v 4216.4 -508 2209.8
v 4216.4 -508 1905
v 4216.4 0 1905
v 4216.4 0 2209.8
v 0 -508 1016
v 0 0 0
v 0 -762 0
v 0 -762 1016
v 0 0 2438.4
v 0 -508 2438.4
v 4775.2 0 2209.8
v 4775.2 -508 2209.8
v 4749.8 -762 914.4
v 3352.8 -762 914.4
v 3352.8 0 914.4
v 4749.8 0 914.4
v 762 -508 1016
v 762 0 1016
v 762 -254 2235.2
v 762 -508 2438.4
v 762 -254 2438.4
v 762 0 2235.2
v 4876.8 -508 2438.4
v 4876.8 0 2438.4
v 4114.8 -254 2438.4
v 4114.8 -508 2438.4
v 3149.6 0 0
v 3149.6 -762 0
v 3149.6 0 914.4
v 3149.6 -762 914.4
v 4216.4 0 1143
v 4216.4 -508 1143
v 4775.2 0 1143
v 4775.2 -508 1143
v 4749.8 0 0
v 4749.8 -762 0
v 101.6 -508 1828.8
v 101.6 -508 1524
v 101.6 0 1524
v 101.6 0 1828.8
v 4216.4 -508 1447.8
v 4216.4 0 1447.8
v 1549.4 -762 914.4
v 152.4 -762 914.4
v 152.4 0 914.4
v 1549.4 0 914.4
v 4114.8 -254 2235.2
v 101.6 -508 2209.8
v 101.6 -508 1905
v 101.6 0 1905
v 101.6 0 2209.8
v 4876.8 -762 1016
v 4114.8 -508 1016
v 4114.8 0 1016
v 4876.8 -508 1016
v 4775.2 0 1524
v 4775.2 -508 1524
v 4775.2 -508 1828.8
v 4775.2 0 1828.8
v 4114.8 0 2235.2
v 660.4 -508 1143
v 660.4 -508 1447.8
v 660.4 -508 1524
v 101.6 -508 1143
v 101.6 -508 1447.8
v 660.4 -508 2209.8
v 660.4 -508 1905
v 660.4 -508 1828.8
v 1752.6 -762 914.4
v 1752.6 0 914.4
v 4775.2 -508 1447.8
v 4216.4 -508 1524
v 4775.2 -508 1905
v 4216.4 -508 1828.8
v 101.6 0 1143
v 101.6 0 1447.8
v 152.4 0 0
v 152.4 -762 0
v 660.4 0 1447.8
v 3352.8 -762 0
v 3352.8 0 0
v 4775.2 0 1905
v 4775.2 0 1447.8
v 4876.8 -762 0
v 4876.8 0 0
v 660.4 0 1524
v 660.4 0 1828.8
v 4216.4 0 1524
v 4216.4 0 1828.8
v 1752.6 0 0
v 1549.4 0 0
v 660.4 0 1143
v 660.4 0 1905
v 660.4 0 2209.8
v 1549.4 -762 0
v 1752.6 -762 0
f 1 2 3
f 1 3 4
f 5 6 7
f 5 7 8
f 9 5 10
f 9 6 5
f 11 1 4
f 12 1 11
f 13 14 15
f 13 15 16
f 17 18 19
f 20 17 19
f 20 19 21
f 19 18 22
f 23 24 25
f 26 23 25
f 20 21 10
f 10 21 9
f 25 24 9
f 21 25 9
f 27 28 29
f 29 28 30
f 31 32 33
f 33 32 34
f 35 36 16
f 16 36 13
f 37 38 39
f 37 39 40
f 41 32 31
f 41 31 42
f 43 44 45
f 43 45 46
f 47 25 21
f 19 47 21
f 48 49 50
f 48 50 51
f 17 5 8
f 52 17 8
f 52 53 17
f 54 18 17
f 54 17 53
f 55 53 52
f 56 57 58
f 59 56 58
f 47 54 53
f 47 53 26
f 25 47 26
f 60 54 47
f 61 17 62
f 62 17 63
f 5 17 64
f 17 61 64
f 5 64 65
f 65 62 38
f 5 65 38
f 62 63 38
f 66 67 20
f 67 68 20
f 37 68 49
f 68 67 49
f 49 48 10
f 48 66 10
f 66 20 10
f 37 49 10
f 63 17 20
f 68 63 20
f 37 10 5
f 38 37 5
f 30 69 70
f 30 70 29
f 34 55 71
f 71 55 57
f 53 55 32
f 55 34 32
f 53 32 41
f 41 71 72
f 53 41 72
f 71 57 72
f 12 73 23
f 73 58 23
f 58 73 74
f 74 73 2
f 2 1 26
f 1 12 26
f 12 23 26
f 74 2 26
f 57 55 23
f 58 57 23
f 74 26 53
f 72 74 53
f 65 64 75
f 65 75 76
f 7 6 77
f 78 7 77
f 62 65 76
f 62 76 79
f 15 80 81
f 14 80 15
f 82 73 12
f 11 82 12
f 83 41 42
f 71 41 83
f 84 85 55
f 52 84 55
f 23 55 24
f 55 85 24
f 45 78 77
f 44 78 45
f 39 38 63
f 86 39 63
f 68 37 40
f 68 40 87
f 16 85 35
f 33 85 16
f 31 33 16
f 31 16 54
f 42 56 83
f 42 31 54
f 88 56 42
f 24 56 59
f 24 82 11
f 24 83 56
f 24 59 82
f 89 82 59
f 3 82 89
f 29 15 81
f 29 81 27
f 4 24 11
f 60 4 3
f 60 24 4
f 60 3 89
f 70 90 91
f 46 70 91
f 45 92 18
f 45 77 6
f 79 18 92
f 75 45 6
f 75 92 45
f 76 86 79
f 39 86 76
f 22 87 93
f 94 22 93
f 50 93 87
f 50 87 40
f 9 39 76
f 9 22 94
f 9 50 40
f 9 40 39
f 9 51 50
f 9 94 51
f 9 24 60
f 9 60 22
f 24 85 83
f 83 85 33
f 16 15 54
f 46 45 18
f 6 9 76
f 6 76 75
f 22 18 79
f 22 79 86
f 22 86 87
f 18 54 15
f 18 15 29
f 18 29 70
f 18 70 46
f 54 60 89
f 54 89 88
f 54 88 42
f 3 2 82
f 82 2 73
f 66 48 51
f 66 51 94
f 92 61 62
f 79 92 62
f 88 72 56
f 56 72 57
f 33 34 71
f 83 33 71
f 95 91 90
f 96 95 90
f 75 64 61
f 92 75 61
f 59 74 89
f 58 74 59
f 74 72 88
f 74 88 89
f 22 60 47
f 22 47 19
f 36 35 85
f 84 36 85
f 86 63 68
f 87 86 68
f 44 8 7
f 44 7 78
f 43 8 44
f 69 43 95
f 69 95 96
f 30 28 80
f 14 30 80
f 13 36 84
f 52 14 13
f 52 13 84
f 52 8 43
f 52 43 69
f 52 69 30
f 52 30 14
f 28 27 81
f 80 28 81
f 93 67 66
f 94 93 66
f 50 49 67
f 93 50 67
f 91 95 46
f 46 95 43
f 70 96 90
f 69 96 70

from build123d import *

# Parameters (mm, degrees)
F0_W     = 4876.8
F0_H     = 1016
F1_DEPTH = 762
F2_W     = 762
F2_H     = 1422.4
F3_DEPTH = 508
F4_W     = 3352.8
F4_H     = 203.2
F5_DEPTH = 254
F6_W     = 1397
F6_H     = 914.4
F7_DEPTH = 762
F8_W     = 558.8
F8_H     = 304.8
F9_DEPTH = 508


with BuildPart() as f1:
    # F0 (on Front) → F1 (new body)
    with BuildSketch(Plane.XZ):
        with Locations((2438.4, 508)):
            Rectangle(F0_W, F0_H)
    extrude(amount=F1_DEPTH)

    # F2 (on face) → F3 (join)
    with BuildSketch(Plane(origin=(0, 0, 0), x_dir=(-1, 0, 0), z_dir=(0, 1, 0))):
        with Locations((-381, 1727.2)):
            Rectangle(F2_W, F2_H)
        with Locations((-4495.8, 1727.2)):
            Rectangle(F2_W, F2_H)
    extrude(amount=-F3_DEPTH)

    # F4 (on face) → F5 (join)
    with BuildSketch(Plane(origin=(0, 0, 0), x_dir=(-1, 0, 0), z_dir=(0, 1, 0))):
        with Locations((-2438.4, 2336.8)):
            Rectangle(F4_W, F4_H)
    extrude(amount=-F5_DEPTH)

    # F6 (on face) → F7 (cut, through all)
    with BuildSketch(Plane.XZ.offset(762)):
        with Locations((850.9, 457.2)):
            Rectangle(F6_W, F6_H)
        with Locations((2451.1, 457.2)):
            Rectangle(F6_W, F6_H)
        with Locations((4051.3, 457.2)):
            Rectangle(F6_W, F6_H)
    extrude(amount=-F7_DEPTH, mode=Mode.SUBTRACT)

    # F8 (on face) → F9 (cut, through all)
    with BuildSketch(Plane.XZ.offset(508)):
        with Locations((381, 1295.4)):
            Rectangle(F8_W, F8_H)
        with Locations((381, 1676.4)):
            Rectangle(F8_W, F8_H)
        with Locations((381, 2057.4)):
            Rectangle(F8_W, F8_H)
        with Locations((4495.8, 1295.4)):
            Rectangle(F8_W, F8_H)
        with Locations((4495.8, 2057.4)):
            Rectangle(F8_W, F8_H)
        with Locations((4495.8, 1676.4)):
            Rectangle(F8_W, F8_H)
    extrude(amount=-F9_DEPTH, mode=Mode.SUBTRACT)


solid = f1.part
